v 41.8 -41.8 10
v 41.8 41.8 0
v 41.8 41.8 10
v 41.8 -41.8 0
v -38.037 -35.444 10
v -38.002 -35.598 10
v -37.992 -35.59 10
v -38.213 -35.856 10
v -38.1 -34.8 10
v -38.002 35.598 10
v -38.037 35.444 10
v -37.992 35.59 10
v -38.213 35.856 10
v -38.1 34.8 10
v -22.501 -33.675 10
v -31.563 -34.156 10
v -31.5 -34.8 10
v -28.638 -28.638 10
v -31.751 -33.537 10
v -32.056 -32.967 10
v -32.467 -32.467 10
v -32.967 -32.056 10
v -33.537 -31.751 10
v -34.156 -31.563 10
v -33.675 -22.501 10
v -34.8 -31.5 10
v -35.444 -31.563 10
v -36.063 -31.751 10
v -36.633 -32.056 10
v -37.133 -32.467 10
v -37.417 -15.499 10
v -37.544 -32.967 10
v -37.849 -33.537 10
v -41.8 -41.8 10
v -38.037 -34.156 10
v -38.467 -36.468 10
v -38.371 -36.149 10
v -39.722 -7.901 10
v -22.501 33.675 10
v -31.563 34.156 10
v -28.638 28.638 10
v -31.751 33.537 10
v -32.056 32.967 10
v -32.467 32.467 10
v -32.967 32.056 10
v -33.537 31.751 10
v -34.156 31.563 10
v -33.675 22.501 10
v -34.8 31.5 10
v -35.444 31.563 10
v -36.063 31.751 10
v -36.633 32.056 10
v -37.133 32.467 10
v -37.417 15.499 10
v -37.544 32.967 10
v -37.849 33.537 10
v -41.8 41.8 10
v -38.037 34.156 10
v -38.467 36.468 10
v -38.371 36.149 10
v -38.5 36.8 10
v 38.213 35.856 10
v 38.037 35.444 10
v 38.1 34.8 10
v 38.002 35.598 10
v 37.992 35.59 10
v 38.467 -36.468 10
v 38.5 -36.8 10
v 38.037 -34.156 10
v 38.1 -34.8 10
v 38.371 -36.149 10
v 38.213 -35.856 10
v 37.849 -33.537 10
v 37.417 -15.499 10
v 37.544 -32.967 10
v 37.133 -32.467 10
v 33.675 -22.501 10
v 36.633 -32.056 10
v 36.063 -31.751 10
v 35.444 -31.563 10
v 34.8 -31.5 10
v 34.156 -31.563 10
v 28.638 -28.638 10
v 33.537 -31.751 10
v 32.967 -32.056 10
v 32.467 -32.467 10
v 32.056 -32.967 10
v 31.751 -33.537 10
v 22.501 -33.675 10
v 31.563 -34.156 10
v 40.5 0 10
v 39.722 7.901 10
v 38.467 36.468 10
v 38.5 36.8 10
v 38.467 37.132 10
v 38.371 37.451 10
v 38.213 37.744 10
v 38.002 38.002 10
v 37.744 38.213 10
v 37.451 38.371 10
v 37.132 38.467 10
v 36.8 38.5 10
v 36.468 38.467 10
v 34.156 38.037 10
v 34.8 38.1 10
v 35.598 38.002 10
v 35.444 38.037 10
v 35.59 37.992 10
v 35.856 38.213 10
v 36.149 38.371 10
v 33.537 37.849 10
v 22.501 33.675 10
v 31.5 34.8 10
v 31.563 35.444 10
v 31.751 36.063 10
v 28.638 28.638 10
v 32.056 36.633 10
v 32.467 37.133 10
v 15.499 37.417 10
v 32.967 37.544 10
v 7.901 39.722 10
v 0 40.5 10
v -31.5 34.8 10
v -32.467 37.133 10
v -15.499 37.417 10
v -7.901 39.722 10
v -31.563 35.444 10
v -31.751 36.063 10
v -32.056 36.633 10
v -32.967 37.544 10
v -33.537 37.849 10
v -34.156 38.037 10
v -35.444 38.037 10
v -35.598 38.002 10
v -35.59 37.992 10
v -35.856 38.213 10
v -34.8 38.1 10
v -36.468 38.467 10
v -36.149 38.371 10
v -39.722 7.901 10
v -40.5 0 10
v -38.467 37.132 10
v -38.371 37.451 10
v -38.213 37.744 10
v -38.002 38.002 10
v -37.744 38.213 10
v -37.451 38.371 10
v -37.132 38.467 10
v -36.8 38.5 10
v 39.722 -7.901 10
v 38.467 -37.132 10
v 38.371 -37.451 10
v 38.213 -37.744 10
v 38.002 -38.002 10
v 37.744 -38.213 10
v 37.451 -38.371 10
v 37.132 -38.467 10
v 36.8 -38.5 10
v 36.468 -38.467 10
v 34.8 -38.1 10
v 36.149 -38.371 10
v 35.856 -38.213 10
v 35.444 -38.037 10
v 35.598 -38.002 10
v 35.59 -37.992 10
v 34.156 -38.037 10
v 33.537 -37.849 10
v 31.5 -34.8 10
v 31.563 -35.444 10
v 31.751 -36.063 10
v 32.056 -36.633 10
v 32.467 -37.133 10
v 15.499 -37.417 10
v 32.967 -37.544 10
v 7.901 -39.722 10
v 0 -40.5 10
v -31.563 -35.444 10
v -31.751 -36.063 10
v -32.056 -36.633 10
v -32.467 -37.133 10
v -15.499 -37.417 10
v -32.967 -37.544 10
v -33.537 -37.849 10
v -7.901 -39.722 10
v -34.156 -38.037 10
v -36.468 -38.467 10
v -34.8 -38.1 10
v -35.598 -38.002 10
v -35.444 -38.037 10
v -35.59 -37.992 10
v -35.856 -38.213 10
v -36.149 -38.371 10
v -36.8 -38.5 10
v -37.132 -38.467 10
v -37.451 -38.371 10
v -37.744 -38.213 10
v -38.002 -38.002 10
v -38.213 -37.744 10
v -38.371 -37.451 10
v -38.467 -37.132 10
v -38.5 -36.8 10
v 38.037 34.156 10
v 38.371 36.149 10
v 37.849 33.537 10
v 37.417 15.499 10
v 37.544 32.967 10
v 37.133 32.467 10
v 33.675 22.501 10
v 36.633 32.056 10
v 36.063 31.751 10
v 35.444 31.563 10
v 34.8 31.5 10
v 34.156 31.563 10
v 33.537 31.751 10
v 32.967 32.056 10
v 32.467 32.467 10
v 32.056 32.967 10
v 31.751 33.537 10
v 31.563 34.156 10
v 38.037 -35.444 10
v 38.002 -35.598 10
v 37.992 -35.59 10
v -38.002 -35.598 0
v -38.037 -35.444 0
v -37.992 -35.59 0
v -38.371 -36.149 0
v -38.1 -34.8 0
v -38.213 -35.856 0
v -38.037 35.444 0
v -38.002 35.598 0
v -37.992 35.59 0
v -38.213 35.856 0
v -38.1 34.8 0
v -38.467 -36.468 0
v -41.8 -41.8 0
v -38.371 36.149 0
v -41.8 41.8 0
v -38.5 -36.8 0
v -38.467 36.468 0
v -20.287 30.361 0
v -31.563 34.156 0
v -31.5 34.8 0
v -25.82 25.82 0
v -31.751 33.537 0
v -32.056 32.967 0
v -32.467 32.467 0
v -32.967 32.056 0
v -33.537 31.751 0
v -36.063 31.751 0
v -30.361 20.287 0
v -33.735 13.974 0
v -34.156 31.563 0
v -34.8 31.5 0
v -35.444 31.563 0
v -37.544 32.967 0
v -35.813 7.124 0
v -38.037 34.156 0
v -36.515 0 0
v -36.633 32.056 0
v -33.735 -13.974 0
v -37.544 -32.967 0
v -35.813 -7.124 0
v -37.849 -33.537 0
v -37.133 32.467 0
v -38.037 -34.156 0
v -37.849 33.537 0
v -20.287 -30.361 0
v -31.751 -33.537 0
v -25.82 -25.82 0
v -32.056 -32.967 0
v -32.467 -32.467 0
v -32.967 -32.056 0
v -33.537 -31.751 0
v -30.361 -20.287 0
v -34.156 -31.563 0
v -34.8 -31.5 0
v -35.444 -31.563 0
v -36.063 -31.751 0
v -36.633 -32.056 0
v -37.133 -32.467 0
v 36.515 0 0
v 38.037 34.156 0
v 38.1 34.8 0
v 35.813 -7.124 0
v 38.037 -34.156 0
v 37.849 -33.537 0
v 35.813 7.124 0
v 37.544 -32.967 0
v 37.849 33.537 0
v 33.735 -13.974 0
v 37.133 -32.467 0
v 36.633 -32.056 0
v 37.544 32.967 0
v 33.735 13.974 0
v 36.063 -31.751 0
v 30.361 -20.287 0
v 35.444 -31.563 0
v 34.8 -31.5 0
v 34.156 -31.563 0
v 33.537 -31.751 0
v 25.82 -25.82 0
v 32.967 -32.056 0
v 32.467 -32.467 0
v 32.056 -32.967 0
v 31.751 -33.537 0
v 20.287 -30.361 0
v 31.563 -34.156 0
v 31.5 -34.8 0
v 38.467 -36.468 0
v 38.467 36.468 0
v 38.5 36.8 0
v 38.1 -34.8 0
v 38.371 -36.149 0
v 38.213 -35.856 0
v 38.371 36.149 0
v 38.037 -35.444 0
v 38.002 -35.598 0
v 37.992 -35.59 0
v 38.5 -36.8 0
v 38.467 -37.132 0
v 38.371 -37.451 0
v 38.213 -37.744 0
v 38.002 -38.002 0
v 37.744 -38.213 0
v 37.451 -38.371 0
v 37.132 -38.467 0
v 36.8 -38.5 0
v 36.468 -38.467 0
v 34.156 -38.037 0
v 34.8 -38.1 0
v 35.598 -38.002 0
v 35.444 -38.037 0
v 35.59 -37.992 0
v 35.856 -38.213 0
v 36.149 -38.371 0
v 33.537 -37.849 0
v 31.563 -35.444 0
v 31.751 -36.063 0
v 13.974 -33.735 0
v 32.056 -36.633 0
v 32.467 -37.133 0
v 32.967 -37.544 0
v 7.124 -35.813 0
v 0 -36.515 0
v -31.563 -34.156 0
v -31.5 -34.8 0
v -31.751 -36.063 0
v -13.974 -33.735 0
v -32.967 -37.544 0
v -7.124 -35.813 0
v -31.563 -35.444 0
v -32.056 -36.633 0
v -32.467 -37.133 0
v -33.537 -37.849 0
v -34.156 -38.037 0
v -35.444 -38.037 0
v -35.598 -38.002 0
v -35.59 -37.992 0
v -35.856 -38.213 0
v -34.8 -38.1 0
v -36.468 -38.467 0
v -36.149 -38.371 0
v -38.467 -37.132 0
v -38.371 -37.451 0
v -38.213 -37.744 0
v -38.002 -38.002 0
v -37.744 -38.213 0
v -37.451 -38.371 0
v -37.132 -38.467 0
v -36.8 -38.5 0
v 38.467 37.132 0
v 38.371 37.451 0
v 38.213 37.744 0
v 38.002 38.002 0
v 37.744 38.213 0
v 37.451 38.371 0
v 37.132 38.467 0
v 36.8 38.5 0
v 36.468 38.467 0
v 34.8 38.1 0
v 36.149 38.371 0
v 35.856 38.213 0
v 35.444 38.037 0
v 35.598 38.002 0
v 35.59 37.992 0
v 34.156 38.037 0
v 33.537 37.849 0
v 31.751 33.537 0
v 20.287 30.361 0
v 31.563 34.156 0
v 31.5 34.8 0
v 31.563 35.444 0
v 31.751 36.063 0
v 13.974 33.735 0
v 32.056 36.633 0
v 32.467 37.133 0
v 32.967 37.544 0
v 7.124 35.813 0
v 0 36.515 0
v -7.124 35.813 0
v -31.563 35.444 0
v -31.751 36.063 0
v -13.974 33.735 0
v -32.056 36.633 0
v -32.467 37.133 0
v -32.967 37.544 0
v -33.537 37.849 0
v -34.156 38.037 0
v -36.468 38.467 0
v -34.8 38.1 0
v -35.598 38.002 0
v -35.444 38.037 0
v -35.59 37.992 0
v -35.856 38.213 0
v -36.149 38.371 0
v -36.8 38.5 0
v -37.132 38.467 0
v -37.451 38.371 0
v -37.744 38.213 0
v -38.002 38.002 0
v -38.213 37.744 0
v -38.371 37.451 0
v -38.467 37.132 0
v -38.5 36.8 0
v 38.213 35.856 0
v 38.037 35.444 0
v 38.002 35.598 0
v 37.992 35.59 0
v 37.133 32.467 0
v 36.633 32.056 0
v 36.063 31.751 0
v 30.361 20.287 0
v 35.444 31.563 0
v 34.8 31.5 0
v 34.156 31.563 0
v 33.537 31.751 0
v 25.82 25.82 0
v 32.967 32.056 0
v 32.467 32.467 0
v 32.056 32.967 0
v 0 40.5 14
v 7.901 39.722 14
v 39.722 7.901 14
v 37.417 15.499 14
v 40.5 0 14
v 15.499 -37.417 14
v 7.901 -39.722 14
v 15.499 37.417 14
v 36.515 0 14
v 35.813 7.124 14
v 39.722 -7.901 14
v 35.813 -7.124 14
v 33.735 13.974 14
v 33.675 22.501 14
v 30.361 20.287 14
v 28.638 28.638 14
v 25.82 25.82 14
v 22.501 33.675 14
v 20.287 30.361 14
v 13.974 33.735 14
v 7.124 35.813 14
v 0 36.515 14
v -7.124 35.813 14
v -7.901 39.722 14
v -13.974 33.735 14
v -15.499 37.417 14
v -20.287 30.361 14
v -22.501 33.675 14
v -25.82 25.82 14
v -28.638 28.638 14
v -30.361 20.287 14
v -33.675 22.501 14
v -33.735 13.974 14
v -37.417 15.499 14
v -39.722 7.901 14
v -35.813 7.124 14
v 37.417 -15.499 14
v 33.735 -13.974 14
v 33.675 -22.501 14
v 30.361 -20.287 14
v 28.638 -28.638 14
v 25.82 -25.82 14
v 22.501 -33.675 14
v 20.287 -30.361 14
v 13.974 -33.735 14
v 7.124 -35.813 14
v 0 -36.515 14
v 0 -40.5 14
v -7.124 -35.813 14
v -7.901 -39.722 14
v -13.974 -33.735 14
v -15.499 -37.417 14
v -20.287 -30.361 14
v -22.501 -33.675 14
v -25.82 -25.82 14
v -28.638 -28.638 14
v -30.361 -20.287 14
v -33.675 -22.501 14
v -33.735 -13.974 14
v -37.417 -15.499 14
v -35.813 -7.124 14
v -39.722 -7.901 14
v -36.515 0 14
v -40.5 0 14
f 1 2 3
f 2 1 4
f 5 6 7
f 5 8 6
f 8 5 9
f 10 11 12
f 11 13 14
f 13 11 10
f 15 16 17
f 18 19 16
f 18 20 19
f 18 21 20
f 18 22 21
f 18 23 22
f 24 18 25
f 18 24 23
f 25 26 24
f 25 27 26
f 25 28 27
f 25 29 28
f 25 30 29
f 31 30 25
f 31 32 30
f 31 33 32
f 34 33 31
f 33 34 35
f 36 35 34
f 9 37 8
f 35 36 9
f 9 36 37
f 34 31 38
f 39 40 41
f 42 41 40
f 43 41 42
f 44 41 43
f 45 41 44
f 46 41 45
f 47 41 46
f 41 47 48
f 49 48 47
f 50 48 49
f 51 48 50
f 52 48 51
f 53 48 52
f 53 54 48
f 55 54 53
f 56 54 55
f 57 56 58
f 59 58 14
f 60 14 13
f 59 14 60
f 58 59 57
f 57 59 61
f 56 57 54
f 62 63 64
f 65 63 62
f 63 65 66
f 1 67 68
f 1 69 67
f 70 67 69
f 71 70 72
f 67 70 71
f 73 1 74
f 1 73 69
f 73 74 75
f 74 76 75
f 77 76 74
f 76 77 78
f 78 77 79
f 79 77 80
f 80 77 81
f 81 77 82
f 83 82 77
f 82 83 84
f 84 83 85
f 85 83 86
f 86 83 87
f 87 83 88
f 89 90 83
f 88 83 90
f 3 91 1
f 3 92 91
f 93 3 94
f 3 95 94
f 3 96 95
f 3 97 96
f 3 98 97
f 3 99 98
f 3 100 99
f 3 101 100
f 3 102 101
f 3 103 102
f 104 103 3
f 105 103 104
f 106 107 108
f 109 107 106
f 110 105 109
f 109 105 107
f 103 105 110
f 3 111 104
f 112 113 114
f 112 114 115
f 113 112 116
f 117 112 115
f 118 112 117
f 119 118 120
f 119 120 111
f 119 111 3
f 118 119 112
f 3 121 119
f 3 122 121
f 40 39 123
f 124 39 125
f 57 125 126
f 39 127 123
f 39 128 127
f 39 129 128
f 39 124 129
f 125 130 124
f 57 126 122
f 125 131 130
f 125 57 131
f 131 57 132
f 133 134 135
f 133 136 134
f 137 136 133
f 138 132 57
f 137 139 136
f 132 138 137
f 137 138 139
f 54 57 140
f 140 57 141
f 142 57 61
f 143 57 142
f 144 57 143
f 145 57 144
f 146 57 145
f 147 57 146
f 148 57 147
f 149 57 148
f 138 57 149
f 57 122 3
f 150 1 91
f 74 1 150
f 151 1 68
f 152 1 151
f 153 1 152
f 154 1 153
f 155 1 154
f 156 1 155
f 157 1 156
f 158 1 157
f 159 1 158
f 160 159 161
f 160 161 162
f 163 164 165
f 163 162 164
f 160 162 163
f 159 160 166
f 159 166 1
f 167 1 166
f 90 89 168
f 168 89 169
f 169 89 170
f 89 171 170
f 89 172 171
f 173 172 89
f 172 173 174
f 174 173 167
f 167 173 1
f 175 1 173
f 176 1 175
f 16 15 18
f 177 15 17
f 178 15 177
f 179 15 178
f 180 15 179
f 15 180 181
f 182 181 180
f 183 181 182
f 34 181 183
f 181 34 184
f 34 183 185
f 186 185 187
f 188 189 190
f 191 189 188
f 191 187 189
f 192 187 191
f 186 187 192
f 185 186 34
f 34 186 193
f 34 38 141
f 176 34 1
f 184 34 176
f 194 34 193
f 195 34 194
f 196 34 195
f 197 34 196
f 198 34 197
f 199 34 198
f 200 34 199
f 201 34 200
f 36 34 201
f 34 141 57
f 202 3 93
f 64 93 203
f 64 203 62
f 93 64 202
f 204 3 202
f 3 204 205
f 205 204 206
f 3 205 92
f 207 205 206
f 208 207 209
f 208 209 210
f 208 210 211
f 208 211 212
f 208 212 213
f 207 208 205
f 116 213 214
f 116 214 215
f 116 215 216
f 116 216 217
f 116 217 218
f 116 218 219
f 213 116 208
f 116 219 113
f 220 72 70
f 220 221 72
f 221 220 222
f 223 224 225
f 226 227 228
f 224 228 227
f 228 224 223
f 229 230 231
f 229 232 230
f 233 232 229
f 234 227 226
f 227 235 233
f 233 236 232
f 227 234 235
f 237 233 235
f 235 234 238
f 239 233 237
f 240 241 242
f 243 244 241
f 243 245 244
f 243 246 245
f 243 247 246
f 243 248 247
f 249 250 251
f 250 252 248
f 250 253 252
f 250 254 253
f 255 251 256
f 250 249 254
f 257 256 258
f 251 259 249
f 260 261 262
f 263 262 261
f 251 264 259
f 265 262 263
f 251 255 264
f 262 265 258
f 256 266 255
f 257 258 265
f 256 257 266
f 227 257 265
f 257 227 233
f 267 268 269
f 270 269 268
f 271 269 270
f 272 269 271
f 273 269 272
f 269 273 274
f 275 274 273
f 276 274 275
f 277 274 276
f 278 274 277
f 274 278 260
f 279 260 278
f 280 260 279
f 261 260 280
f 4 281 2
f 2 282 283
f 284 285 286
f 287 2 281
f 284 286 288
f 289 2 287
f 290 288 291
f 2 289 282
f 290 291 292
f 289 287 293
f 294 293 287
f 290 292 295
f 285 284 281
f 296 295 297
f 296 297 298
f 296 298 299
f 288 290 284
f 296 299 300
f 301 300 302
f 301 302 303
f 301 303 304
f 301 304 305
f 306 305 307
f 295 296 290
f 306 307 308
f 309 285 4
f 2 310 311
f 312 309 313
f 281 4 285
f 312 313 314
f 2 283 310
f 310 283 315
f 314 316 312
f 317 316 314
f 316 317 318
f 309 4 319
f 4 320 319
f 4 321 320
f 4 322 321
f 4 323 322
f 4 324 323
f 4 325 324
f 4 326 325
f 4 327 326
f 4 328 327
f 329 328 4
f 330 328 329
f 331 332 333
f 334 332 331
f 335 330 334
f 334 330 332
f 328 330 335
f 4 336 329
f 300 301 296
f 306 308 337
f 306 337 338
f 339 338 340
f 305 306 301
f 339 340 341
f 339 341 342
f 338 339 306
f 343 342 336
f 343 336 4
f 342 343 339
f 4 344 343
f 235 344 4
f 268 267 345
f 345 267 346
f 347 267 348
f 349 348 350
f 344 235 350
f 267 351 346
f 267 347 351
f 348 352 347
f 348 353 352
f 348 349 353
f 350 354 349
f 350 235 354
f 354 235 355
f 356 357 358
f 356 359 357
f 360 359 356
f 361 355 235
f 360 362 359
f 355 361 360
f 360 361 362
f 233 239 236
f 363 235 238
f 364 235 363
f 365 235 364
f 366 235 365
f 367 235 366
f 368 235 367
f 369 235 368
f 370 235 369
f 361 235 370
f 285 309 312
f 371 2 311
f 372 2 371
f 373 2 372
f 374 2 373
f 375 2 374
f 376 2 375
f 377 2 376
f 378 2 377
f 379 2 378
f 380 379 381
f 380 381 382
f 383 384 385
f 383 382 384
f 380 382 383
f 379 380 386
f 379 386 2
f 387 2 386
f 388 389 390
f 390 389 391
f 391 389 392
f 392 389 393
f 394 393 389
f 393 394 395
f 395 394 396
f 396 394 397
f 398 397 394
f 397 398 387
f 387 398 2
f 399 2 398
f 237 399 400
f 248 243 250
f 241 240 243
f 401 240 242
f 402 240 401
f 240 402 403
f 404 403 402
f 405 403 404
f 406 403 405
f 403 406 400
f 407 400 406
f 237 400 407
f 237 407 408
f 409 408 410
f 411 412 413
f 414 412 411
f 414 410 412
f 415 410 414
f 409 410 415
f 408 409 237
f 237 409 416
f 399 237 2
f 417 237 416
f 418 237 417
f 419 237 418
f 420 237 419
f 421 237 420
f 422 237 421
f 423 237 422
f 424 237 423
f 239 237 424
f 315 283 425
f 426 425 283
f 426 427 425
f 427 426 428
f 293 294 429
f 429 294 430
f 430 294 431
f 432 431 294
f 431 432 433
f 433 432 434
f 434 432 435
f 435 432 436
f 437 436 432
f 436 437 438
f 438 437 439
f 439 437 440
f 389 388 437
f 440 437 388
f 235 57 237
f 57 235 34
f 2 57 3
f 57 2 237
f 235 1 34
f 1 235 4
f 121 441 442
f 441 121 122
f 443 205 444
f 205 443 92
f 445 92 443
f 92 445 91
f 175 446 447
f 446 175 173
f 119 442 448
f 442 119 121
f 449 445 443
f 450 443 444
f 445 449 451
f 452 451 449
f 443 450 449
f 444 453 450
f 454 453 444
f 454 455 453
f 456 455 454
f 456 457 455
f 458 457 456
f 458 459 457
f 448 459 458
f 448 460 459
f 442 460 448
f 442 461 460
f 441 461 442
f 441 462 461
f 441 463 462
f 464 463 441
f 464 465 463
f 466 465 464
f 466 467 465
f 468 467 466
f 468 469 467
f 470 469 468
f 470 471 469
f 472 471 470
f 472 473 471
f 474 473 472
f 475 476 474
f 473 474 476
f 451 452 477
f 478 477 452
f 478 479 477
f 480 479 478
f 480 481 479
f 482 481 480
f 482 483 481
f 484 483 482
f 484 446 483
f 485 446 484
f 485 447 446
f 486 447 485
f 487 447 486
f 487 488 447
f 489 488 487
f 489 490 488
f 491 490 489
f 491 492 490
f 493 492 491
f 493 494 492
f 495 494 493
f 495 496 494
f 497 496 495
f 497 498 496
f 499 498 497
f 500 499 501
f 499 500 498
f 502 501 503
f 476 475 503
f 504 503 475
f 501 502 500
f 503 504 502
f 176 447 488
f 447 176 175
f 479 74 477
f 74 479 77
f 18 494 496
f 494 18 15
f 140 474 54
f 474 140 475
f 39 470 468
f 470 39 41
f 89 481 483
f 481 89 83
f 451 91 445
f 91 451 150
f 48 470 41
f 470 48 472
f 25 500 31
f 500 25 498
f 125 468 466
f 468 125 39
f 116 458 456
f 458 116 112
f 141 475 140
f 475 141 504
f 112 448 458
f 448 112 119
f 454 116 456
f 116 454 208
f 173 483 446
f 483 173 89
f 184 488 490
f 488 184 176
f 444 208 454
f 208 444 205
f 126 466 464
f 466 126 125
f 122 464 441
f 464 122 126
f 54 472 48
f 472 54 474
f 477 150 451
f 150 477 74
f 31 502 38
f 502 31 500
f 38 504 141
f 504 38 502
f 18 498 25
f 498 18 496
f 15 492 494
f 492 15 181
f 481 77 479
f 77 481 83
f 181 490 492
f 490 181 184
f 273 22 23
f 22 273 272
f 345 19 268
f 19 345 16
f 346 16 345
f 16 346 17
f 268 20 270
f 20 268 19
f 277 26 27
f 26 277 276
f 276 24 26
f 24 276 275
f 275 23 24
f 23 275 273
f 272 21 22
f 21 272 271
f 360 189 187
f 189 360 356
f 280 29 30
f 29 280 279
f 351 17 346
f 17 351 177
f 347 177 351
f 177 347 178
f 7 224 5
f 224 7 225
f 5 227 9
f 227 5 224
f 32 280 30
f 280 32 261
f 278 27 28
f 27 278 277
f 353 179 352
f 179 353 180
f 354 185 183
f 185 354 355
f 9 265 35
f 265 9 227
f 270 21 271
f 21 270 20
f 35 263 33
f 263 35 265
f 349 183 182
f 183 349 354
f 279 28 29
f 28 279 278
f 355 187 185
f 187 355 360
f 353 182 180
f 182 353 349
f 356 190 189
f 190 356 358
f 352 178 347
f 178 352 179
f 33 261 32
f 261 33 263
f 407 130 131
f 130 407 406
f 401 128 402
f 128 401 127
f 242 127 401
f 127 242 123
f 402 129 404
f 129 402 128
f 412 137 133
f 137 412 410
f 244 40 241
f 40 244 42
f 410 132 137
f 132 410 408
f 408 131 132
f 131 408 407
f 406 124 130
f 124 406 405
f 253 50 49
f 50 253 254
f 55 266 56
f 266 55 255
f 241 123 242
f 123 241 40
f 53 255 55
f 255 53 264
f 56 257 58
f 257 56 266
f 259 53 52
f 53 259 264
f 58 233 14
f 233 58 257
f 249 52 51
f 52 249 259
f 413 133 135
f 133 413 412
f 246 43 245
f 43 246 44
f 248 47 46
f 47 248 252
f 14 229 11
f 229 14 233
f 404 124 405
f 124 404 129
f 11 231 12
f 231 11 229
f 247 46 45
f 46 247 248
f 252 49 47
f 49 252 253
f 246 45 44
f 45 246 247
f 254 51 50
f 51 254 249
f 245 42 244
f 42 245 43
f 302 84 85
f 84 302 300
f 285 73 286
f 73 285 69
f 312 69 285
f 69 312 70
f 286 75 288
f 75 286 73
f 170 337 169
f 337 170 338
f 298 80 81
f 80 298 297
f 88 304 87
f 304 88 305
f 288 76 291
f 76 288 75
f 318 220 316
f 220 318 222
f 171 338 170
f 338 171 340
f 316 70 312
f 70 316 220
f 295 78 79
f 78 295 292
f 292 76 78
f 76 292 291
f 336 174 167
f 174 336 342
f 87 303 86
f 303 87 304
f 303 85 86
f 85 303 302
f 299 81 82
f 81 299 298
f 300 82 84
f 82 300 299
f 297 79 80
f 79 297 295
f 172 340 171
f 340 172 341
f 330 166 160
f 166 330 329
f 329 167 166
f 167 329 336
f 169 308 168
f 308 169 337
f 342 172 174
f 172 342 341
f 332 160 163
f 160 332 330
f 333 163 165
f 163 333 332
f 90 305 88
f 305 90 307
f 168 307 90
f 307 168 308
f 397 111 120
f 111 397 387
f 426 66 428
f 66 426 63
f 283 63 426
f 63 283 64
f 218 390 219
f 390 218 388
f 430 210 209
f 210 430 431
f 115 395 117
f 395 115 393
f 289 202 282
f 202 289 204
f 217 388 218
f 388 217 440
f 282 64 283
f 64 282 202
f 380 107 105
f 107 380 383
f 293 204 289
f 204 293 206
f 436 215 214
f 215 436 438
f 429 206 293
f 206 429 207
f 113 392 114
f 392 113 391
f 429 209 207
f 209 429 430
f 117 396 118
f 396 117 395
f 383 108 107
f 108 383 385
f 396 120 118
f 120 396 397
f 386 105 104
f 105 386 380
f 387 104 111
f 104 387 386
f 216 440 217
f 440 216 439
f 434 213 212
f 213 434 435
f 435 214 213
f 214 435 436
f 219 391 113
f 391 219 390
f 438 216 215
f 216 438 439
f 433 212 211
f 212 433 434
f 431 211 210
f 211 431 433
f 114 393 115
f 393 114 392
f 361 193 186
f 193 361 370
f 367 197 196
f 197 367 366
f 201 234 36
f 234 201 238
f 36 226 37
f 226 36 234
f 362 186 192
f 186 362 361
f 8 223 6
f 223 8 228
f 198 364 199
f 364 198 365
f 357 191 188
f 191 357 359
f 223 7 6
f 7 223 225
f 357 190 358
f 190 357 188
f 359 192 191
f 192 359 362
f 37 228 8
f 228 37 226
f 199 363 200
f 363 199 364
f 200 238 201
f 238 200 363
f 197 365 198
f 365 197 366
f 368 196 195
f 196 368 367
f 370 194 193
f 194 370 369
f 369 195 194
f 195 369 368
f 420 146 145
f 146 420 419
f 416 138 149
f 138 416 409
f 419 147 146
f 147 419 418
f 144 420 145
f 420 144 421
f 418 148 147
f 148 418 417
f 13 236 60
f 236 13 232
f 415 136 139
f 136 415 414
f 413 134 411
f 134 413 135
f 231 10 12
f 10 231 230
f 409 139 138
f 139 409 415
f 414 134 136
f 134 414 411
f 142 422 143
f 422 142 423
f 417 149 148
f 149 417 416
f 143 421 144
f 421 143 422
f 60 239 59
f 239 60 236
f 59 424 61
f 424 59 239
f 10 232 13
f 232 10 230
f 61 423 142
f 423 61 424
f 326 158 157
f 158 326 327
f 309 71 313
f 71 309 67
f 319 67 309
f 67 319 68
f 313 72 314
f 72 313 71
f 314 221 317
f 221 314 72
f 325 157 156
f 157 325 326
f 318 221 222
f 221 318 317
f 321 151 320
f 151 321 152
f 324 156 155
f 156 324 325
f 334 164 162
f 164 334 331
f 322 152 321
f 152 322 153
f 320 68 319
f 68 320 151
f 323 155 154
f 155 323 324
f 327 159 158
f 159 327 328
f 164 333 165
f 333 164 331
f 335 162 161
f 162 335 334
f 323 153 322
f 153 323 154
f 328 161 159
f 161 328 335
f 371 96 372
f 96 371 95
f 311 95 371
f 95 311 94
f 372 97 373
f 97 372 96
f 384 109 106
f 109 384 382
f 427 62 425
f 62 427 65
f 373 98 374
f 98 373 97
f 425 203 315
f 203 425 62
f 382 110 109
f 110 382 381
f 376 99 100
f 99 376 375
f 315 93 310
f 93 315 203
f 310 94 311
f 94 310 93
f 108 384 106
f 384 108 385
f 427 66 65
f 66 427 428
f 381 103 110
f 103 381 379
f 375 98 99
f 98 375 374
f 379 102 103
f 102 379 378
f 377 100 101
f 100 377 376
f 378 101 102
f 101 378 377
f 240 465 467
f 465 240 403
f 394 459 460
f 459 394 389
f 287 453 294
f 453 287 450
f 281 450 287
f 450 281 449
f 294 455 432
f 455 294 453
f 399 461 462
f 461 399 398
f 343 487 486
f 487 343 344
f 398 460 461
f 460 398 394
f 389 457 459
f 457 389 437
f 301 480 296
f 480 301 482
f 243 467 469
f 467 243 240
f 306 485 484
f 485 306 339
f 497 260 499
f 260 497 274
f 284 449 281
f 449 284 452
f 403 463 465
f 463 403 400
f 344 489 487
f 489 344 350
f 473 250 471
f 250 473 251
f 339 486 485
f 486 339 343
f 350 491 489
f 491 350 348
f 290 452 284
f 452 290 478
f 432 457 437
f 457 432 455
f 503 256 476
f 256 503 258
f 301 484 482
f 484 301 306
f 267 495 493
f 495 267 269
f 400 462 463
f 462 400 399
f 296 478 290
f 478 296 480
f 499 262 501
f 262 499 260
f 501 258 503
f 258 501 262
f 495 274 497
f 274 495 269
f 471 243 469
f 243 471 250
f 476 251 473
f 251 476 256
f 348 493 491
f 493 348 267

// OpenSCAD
$fn = 32;

// ----------------------------------------------------------------------
// Motor mount plate: NEMA34, 83.6 x 83.6 x 14 mm
// ----------------------------------------------------------------------

// --- parameters (mm) ---
base_x = 83.6;            // plate length, X
base_y = 83.6;            // plate width, Y
thick = 10;               // plate thickness
bolt_pitch = 69.6;        // NEMA34 bolt spacing
motor_d = 6.6;            // NEMA34 screw clearance
boss_hole = 73.03;        // pilot boss bore
boss_d = 81;              // raised pilot ring
boss_h = 4;               // raised pilot ring height
second_d = 3.4;           // second fastener hole

module plate() {
  translate([-base_x / 2, -base_y / 2, 0]) cube([base_x, base_y, thick]);
}

module motor_holes() {
  for (sx = [-1, 1]) for (sy = [-1, 1])
    translate([sx * bolt_pitch / 2, sy * bolt_pitch / 2, -1])
      cylinder(h = thick + 2, d = motor_d);
}
module pilot_ring() {
  translate([0, 0, thick - 1]) cylinder(h = boss_h + 1, d = boss_d);
}

difference() {
  union() {
    plate();
    pilot_ring();
  }
  motor_holes();
  translate([0, 0, -1]) cylinder(h = thick + boss_h + 2, d = boss_hole);
  for (sx = [-1, 1]) for (sy = [-1, 1])
    translate([sx * 36.8, sy * 36.8, -1]) cylinder(h = thick + 2, d = second_d);
}
